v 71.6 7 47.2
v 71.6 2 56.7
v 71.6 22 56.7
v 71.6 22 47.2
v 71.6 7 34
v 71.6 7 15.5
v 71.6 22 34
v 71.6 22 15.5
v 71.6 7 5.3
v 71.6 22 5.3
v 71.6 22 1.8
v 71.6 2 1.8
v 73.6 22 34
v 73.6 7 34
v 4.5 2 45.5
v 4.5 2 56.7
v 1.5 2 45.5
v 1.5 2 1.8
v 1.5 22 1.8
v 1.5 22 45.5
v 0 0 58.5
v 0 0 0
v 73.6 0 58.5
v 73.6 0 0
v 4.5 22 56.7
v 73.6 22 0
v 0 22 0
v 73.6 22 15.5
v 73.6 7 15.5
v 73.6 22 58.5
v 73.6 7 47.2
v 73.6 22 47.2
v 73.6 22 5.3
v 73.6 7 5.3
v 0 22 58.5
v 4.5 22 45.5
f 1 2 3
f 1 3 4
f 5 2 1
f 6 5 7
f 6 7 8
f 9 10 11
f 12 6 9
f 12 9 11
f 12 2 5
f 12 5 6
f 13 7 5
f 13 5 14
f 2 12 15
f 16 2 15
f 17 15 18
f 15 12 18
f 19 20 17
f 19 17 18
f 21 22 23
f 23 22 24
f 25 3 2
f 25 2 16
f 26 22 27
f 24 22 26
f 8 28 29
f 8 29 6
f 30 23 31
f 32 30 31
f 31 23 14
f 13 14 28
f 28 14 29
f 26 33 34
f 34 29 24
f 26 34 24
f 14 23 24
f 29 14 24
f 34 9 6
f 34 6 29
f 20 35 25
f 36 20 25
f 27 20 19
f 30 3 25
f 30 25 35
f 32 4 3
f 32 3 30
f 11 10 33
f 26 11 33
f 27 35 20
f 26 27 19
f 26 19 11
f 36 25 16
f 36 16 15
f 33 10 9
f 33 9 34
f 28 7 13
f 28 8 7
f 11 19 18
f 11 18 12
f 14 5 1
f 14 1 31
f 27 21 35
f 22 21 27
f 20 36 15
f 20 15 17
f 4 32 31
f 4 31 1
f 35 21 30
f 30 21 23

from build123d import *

# Parameters (mm, degrees)
SKETCH_1_W          = 73.6
SKETCH_1_H          = 58.5
EXTRUDE_1_DEPTH     = 22
CUT_EXTRUDE_2_DEPTH = 20
SKETCH_4_W          = 2
SKETCH_4_H          = 10.2
SKETCH_4_H_2        = 13.2
EXTRUDE_2_DEPTH     = 5


with BuildPart() as part:
    # Эскиз1 → Бобышка-Вытянуть1 (new body)
    with BuildSketch(Plane(origin=(0, 0, 0), x_dir=(1, 0, 0), z_dir=(0, 1, 0))):
        with Locations((36.8, -29.25)):
            Rectangle(SKETCH_1_W, SKETCH_1_H)
    extrude(amount=EXTRUDE_1_DEPTH)

    # Эскиз3 → Вырез-Вытянуть2 (cut)
    with BuildSketch(Plane(origin=(0, 22, 0), x_dir=(1, 0, 0), z_dir=(0, 1, 0))):
        Polygon((1.5, -1.8), (71.6, -1.8), (71.6, -5.3), (73.6, -5.3), (73.6, -15.5), (71.6, -15.5), (71.6, -34), (73.6, -34), (73.6, -47.2), (71.6, -47.2), (71.6, -56.7), (4.5, -56.7), (4.5, -45.5), (1.5, -45.5), align=None)
    extrude(amount=-CUT_EXTRUDE_2_DEPTH, mode=Mode.SUBTRACT)

    # Эскиз4 → Бобышка-Вытянуть2 (add)
    with BuildSketch(Plane(origin=(0, 2, 0), x_dir=(1, 0, 0), z_dir=(0, 1, 0))):
        with Locations((72.6, -10.4)):
            Rectangle(SKETCH_4_W, SKETCH_4_H)
        with Locations((72.6, -40.6)):
            Rectangle(SKETCH_4_W, SKETCH_4_H_2)
    extrude(amount=EXTRUDE_2_DEPTH)


solid = part.part
